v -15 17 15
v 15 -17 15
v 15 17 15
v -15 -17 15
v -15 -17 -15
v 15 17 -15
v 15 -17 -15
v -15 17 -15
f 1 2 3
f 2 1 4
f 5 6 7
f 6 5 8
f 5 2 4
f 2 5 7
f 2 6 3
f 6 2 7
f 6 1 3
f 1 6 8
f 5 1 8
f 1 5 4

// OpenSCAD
$fn = 64;

block_x = 30.0;
block_y = 34.0;
block_z = 30.0;

// Leadscrew nut housing block (single connected solid)
cube([block_x, block_y, block_z], center=true);
